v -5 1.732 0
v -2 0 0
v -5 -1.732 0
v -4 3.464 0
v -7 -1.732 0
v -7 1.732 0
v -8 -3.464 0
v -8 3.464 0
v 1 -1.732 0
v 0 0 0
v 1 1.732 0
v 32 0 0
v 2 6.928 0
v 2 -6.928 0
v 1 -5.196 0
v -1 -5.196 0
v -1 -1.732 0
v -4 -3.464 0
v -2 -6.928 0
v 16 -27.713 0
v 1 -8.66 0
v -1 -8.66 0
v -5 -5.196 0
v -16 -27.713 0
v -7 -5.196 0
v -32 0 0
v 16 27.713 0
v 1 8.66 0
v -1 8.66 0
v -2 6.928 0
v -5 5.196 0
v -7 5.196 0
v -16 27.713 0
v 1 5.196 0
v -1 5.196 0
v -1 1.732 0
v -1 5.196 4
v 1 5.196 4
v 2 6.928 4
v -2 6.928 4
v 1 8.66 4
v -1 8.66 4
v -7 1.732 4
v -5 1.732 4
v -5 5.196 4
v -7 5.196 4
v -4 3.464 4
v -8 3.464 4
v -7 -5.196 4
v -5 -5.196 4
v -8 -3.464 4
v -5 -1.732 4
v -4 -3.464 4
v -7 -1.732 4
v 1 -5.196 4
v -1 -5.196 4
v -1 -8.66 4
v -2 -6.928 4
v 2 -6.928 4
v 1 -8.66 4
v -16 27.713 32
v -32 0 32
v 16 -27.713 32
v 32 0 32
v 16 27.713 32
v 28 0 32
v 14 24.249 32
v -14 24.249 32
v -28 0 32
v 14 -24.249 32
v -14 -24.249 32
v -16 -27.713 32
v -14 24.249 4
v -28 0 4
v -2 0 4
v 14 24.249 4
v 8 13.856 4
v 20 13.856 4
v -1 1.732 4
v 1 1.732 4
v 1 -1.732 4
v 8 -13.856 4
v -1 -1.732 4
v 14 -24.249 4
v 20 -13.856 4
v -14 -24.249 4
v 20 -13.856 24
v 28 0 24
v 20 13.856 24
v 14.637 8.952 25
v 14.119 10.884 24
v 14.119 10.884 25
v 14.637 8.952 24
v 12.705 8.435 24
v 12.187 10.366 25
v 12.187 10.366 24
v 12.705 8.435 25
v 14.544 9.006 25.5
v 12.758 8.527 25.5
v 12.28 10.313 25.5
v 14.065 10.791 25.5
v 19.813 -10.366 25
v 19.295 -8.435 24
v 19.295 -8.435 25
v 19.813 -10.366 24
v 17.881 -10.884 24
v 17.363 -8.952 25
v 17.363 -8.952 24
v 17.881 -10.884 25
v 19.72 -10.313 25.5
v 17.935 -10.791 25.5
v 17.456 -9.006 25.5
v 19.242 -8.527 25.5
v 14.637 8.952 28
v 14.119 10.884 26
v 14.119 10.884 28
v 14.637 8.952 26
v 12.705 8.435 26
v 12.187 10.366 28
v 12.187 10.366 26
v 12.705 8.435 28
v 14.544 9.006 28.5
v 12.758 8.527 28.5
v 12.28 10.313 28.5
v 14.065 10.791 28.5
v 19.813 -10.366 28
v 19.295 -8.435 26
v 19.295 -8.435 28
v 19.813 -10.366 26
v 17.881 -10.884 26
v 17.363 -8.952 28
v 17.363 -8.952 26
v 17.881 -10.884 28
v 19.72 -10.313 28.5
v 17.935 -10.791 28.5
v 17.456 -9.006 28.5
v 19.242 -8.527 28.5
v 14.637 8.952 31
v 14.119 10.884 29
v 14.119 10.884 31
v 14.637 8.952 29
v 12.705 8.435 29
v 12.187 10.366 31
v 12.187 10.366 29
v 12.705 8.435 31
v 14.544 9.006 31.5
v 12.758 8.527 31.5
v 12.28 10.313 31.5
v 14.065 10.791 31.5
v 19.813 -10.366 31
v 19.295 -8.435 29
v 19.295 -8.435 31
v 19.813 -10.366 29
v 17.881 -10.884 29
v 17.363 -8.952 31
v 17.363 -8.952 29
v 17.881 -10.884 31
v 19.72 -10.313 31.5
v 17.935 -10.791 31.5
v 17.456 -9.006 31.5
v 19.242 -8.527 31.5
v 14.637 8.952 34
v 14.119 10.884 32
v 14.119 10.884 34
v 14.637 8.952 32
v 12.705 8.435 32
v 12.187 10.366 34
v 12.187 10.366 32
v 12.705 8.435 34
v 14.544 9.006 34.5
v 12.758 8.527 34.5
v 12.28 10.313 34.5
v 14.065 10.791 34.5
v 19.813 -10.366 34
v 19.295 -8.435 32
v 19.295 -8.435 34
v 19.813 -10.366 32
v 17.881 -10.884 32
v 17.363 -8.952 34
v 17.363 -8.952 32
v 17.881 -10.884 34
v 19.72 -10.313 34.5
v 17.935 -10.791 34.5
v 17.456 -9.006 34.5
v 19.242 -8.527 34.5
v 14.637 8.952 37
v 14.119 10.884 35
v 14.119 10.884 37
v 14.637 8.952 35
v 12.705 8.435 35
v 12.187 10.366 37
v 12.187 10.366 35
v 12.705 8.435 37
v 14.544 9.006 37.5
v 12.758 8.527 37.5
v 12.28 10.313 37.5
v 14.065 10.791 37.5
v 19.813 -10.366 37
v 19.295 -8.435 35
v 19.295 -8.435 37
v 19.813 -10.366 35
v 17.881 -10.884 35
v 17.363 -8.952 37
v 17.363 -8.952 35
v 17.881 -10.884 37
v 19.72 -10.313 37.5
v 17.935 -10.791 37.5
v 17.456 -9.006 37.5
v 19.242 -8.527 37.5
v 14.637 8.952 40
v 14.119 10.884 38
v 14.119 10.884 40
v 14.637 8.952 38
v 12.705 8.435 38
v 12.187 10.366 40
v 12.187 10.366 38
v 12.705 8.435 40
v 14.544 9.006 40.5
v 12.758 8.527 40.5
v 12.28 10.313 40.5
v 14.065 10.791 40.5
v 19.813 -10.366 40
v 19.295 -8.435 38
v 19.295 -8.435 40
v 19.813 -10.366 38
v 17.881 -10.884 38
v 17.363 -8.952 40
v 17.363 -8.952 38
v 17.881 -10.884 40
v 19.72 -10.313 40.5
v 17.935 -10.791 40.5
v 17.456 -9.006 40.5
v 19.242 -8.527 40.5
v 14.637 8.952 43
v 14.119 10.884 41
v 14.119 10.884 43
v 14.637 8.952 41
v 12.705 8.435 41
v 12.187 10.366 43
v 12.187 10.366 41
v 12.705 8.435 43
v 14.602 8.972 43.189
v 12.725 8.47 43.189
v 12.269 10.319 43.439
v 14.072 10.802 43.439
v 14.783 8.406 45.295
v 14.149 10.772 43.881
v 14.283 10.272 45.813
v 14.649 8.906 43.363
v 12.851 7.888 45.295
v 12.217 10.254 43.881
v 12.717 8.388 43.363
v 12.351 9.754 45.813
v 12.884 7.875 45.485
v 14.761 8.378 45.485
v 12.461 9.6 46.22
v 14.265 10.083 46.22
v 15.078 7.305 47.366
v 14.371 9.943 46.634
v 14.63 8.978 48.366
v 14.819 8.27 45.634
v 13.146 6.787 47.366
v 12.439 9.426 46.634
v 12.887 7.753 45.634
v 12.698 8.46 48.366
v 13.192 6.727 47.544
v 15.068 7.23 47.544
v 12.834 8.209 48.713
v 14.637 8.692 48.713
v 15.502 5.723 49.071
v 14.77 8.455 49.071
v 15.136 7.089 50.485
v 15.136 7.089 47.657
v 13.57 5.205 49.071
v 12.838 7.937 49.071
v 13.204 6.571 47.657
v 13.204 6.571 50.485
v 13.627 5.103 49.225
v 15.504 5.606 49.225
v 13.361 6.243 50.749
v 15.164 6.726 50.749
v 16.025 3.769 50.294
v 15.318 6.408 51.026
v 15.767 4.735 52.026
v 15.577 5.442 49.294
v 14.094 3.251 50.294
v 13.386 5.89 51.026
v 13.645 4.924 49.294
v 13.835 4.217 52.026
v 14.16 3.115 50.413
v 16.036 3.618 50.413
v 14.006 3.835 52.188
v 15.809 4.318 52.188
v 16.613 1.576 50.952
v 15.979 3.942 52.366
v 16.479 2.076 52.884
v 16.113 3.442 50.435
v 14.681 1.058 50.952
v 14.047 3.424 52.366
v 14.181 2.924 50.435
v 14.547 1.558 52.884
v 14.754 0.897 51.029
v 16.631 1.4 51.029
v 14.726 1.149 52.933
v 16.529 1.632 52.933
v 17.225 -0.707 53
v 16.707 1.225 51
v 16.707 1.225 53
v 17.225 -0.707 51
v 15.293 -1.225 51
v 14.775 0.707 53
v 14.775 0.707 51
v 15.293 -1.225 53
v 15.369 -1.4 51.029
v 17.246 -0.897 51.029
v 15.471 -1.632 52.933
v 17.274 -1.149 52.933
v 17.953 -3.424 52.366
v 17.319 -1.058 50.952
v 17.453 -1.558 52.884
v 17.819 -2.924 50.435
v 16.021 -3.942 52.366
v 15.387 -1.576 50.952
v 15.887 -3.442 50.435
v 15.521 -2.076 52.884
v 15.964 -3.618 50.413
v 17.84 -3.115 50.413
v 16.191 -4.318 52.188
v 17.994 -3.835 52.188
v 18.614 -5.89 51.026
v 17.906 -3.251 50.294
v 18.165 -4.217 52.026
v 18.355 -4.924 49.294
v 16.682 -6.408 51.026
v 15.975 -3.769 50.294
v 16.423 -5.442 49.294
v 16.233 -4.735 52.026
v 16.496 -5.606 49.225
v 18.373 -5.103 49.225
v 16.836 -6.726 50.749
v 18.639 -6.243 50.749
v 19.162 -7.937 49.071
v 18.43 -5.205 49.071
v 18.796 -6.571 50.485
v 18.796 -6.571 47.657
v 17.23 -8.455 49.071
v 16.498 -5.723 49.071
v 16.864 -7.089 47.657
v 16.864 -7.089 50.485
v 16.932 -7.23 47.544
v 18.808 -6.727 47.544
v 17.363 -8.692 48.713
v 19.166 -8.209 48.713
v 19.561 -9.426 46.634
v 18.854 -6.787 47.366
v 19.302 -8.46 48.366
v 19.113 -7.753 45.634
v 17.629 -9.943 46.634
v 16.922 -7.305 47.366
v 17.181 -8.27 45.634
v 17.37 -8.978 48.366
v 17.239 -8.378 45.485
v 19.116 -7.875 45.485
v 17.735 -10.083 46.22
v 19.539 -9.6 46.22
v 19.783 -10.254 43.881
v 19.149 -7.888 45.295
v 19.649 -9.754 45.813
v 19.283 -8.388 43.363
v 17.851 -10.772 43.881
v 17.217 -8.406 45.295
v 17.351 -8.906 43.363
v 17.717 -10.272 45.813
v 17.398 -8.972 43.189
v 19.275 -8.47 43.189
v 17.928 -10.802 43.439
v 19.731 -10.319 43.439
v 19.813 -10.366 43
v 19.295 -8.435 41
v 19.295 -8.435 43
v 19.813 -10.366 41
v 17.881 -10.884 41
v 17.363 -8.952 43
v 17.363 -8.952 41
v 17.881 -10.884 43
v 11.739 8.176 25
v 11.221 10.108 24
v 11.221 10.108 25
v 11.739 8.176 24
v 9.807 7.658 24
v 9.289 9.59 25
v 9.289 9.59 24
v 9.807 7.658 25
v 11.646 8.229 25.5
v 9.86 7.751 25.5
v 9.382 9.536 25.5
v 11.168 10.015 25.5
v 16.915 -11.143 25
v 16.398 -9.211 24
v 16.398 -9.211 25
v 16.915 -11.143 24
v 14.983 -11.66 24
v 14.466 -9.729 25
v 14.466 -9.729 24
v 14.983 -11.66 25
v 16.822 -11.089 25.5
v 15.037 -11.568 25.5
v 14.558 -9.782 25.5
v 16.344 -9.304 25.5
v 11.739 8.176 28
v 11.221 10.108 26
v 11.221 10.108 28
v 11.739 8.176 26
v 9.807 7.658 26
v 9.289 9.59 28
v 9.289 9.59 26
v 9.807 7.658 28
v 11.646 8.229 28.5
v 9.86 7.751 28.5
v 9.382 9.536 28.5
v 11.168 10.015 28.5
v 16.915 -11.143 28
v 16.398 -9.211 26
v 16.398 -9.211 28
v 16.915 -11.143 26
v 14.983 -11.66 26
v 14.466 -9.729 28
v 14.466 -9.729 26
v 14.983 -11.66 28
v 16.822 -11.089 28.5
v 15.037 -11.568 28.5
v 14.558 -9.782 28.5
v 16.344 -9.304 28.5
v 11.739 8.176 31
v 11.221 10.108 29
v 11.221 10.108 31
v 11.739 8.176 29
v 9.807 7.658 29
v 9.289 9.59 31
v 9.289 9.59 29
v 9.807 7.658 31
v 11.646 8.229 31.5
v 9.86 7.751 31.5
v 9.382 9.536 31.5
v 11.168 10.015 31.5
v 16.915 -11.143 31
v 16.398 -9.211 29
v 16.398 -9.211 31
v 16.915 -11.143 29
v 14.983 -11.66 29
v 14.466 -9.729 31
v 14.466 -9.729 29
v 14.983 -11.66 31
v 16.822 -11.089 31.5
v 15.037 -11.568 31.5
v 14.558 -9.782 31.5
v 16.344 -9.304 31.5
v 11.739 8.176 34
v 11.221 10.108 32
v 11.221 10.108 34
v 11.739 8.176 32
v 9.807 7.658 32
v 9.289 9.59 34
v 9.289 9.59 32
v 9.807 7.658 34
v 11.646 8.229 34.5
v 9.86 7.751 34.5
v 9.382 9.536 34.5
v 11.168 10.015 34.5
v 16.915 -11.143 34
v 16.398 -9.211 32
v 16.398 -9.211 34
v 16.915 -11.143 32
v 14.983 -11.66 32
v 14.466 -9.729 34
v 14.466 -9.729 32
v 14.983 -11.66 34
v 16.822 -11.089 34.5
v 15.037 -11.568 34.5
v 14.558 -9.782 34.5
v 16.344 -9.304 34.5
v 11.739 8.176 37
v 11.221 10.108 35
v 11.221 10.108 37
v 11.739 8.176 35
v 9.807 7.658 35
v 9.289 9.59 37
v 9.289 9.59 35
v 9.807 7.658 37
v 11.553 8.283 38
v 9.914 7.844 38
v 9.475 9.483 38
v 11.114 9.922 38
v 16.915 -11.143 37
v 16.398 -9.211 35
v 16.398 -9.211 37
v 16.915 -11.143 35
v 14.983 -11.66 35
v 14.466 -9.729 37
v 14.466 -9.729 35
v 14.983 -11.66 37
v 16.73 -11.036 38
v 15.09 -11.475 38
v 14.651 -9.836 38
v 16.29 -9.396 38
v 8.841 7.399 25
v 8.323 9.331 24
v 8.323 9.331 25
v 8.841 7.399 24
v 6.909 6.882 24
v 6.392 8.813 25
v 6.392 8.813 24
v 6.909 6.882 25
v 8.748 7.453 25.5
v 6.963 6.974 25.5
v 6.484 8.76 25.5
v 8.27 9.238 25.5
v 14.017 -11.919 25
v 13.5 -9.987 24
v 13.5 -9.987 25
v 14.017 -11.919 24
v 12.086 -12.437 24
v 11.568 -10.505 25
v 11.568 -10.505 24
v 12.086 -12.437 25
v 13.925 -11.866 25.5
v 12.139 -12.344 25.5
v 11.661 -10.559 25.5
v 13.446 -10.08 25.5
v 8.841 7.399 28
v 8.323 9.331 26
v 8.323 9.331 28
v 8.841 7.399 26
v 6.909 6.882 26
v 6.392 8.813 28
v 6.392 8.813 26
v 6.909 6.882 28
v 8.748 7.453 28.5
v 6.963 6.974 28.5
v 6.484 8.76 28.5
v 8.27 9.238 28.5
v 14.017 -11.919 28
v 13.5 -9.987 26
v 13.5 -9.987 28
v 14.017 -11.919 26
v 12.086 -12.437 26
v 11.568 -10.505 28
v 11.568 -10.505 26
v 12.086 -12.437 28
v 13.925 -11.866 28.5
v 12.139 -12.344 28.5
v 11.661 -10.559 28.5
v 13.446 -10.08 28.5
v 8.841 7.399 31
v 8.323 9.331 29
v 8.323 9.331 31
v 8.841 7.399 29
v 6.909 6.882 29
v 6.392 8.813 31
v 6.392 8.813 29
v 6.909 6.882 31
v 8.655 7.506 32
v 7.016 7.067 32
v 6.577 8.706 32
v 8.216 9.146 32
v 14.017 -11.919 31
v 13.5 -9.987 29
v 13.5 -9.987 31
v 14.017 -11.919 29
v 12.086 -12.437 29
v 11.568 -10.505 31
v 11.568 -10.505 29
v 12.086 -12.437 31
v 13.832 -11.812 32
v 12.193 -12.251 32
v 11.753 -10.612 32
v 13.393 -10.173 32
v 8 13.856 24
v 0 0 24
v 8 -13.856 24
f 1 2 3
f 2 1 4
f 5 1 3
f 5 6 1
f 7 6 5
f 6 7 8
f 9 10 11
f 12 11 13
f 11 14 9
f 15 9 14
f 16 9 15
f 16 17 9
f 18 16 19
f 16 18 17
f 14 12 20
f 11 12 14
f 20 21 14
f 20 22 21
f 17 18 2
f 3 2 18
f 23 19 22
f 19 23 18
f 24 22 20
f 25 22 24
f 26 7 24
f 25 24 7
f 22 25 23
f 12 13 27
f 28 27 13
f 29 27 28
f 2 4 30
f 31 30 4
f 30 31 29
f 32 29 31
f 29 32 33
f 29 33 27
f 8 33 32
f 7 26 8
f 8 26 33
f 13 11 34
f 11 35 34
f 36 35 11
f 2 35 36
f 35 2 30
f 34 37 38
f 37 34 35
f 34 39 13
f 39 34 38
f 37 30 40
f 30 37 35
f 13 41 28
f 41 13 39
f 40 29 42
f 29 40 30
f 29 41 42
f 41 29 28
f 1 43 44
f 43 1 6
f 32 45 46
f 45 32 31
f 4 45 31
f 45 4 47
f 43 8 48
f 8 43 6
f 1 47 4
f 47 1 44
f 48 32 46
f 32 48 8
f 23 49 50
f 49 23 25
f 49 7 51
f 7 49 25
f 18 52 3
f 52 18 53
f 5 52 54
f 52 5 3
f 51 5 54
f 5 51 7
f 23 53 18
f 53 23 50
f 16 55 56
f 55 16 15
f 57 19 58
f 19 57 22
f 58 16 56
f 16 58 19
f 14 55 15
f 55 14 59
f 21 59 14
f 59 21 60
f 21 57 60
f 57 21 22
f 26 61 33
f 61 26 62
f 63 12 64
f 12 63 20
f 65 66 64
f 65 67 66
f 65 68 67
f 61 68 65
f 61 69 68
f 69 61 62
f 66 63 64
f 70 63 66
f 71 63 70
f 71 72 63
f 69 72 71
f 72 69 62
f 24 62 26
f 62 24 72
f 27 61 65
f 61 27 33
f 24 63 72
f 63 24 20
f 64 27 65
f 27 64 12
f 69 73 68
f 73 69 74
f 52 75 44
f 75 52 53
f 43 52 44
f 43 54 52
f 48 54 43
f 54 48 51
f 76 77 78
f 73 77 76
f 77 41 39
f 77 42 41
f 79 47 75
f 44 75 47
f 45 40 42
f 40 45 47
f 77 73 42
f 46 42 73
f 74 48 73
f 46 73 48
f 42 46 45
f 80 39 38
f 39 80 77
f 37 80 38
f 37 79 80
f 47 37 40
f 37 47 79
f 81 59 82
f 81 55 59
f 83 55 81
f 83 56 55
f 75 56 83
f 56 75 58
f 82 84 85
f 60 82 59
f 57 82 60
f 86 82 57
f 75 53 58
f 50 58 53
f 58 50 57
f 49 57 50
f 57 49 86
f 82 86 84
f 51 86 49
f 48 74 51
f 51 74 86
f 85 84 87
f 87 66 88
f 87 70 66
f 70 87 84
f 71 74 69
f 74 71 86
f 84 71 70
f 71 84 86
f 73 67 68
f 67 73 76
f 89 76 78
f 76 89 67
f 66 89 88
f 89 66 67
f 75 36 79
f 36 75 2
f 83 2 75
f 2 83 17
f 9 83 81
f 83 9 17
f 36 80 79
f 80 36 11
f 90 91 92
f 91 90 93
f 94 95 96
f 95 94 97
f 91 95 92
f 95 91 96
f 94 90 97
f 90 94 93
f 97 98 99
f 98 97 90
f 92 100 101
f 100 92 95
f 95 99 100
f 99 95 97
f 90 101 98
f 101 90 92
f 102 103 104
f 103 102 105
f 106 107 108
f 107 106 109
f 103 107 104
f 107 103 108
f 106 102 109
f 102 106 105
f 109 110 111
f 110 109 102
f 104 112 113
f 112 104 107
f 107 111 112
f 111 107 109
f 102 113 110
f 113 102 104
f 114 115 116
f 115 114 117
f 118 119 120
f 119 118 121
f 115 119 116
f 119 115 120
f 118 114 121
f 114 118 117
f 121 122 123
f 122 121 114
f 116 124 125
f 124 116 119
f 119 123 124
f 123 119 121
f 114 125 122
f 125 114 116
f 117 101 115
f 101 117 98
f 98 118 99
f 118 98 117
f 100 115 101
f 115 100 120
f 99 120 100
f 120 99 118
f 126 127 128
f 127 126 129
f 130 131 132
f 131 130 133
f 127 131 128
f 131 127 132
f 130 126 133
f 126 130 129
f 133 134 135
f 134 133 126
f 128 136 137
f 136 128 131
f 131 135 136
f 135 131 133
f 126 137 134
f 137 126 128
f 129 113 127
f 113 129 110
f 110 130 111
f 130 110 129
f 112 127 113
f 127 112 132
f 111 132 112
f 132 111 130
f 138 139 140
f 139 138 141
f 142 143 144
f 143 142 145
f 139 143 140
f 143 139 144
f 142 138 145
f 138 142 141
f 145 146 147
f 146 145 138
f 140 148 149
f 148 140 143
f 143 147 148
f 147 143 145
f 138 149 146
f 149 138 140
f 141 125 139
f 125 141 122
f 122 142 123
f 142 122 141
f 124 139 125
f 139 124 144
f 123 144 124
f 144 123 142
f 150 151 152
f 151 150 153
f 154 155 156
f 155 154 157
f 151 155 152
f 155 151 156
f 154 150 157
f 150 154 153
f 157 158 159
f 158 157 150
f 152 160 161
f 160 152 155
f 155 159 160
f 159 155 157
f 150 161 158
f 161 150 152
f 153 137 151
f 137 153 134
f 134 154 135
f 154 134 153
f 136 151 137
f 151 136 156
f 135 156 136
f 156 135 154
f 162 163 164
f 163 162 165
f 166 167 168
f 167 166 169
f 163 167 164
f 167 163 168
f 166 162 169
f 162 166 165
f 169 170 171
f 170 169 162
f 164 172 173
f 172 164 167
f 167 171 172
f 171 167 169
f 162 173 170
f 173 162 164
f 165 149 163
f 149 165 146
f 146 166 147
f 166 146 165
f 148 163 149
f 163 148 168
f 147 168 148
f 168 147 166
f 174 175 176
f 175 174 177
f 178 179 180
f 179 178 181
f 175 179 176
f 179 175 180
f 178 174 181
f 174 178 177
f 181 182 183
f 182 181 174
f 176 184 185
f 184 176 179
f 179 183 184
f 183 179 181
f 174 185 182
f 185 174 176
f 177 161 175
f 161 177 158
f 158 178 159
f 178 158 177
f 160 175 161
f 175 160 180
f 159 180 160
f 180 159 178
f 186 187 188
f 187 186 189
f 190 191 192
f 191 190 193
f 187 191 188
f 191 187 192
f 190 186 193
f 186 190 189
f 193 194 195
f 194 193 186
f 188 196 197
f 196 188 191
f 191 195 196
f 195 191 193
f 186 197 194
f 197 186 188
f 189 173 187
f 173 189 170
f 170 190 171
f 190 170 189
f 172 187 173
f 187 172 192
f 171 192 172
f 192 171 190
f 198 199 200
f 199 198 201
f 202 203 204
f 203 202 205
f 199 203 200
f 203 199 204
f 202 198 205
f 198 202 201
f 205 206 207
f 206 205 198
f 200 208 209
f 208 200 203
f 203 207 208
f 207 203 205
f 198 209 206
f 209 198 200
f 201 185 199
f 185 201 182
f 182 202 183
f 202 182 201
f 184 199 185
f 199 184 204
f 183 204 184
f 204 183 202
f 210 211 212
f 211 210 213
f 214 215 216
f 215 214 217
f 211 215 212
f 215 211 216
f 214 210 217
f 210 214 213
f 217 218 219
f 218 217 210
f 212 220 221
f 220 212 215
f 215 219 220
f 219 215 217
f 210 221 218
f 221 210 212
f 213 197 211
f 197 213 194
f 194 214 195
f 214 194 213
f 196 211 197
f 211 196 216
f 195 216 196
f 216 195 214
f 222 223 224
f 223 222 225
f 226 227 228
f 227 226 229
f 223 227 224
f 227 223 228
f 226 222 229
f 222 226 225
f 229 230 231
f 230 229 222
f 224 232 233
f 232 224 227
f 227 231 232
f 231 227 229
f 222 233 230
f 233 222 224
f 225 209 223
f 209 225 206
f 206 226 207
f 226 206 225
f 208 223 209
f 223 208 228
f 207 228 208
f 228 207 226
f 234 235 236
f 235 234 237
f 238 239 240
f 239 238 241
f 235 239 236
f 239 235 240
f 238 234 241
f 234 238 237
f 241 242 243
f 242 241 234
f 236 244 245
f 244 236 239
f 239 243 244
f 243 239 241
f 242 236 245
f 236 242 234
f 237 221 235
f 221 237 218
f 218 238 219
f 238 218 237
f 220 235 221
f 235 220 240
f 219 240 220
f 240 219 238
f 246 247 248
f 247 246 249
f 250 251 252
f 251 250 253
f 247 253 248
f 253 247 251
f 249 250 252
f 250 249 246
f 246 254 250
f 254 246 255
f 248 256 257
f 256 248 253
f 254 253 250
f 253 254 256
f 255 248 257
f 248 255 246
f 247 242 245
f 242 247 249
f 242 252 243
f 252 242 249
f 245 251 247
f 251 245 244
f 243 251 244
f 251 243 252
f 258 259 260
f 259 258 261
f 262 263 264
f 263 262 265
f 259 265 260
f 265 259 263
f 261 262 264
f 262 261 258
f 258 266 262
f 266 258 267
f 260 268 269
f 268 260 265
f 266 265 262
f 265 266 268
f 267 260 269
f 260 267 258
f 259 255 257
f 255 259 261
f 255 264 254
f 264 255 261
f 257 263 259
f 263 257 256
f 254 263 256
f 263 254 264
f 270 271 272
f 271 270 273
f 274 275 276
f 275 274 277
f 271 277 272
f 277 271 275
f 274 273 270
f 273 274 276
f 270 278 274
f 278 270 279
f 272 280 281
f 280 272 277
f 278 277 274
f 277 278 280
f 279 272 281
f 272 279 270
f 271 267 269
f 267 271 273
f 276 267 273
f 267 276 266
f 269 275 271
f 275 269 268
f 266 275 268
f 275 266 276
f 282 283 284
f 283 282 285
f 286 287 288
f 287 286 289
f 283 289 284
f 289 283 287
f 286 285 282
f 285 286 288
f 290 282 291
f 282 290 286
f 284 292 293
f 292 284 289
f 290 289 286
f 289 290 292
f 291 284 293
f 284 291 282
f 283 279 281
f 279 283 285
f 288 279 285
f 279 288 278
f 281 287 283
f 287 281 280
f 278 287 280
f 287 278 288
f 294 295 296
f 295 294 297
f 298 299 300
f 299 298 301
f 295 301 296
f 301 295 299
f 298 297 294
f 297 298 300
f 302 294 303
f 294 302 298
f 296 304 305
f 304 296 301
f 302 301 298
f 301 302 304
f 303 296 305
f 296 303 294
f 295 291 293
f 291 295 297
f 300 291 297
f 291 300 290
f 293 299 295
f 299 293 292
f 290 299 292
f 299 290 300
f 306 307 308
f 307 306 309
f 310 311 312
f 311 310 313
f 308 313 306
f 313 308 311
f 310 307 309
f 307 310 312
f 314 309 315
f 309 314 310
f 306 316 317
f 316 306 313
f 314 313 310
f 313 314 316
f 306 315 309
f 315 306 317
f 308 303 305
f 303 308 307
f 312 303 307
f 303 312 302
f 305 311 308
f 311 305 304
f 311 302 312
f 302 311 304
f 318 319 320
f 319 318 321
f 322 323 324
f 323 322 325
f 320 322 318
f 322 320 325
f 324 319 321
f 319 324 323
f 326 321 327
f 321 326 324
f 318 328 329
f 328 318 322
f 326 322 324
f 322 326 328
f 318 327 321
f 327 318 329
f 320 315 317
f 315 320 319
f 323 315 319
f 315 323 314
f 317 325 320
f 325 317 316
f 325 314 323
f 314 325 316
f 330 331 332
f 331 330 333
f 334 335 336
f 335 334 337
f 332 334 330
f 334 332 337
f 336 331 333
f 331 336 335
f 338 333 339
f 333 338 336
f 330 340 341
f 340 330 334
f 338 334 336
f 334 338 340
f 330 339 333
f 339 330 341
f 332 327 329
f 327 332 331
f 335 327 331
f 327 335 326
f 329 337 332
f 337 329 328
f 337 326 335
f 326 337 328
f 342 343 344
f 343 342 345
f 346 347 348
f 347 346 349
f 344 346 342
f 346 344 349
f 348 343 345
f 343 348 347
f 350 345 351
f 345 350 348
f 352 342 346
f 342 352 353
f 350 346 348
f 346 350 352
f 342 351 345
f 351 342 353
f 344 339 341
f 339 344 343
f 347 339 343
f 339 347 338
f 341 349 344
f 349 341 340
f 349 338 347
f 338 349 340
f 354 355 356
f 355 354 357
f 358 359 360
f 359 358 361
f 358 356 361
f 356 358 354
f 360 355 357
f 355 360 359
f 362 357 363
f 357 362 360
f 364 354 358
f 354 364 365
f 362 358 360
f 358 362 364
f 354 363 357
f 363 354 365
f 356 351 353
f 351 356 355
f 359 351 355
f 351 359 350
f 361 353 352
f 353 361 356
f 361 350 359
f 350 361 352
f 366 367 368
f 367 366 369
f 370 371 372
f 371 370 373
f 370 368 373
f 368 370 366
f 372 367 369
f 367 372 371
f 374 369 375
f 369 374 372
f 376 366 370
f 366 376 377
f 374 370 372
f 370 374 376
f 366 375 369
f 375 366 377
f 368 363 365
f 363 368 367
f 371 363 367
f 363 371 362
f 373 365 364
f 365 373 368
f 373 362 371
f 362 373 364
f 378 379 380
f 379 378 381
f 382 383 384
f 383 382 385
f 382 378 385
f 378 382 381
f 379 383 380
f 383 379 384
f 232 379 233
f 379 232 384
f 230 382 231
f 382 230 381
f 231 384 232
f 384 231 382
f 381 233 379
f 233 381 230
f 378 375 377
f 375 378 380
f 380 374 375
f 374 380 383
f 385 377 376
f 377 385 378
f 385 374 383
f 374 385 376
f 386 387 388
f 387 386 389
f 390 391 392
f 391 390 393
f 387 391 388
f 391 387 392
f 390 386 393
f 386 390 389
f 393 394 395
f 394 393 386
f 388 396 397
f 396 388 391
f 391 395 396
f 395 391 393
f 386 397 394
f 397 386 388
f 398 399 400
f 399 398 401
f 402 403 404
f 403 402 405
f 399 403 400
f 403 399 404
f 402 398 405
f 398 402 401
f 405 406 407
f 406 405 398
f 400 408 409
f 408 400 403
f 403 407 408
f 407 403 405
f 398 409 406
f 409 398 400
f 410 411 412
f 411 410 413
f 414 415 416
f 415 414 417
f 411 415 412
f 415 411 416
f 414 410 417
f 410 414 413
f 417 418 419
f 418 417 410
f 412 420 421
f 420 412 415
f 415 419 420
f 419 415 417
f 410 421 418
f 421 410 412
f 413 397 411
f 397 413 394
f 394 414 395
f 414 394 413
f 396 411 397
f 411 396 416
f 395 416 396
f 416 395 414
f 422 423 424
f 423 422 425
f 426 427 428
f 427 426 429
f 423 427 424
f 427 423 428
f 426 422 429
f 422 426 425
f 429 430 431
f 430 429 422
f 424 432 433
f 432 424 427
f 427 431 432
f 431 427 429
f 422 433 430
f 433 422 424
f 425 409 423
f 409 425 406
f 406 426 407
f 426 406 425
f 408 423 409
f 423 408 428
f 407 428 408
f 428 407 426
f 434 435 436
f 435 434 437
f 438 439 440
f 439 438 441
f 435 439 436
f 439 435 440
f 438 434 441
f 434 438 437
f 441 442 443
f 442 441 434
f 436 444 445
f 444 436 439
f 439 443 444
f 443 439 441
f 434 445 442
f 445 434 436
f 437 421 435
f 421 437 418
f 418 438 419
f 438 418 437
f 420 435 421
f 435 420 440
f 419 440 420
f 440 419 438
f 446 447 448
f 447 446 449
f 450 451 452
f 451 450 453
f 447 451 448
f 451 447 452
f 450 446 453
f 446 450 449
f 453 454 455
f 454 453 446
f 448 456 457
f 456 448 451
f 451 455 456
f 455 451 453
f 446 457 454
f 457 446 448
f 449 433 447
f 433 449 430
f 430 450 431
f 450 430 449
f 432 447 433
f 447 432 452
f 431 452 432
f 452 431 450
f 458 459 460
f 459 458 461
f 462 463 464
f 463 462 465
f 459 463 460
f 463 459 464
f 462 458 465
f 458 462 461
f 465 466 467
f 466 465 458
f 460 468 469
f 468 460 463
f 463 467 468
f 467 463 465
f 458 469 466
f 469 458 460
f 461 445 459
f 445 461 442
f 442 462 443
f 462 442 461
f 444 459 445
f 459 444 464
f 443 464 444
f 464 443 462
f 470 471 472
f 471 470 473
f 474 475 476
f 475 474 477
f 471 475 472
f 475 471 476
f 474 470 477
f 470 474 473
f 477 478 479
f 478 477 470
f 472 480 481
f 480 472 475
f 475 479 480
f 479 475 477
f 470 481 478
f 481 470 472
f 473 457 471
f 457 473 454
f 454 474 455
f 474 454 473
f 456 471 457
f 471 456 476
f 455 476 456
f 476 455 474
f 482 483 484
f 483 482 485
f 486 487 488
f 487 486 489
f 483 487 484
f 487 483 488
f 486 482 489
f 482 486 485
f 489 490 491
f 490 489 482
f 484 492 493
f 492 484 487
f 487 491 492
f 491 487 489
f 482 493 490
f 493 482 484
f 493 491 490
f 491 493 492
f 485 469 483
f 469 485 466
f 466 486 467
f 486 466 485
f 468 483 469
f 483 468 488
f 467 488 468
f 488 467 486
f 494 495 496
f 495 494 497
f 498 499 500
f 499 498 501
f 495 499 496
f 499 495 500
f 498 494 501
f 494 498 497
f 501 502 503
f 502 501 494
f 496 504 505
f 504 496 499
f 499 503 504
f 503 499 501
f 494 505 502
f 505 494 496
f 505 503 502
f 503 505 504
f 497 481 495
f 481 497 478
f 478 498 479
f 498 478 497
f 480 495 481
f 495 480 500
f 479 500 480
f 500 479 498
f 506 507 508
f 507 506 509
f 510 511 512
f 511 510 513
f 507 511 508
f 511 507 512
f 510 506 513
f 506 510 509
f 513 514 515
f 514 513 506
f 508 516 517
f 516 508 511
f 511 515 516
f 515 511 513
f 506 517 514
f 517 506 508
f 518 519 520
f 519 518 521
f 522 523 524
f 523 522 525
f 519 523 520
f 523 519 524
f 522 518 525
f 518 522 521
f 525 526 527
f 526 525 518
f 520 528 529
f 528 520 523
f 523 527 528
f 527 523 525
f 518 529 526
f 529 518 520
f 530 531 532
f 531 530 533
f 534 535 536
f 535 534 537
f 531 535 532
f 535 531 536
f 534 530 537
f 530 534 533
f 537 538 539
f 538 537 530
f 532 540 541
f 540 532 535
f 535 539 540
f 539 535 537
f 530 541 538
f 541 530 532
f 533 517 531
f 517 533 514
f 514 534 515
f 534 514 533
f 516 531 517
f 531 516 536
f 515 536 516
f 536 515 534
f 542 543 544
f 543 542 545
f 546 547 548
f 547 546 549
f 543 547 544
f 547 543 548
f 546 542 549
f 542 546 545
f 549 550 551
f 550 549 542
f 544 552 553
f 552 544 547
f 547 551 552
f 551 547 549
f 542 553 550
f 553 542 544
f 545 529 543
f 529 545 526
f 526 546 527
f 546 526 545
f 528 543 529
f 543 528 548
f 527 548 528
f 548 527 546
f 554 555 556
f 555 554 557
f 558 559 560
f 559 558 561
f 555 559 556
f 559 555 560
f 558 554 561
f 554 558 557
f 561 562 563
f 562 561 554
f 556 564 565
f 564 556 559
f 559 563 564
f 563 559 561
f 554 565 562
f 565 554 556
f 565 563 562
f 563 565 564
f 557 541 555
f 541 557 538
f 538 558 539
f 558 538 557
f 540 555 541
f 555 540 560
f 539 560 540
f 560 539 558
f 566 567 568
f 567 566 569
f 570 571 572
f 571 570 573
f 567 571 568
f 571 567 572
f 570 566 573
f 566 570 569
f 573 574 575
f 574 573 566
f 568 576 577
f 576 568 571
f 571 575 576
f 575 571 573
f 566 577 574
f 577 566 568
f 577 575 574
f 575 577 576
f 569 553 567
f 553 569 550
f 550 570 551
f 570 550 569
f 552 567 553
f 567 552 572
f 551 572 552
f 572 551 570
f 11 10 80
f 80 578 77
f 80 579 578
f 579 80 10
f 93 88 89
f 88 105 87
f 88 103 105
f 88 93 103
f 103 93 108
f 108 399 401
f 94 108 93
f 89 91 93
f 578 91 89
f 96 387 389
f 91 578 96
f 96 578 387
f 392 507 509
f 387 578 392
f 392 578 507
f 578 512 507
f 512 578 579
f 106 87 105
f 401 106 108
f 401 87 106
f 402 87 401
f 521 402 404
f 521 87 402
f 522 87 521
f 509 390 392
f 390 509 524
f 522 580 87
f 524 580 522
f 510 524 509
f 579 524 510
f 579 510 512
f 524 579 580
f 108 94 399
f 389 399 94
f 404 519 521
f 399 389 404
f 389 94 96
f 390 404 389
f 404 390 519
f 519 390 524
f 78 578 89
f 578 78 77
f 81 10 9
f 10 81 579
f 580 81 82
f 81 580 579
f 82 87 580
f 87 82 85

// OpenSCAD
// file: planter_base.scad
module planter_base() {
    difference() {
        linear_extrude(32) circle(32, $fn=6);
        translate([0, 0, 4]) linear_extrude(32) circle(28, $fn = 6);
        linear_extrude(8) circle(2, $fn = 6);
        for (i = [0:60:300]) {
            linear_extrude(8) rotate(i) translate([6, cos(30)*4]) circle(2, $fn = 6);
        }
    }
}
// main file
include <planter_base.scad>;

module planter_01() {
    module brick() {
        union() {
            cube(2, center = true);
            translate([0, 0, 1.5]) rotate(45) cylinder(1, r1 = sqrt(2), r2 = 1.2, center = true, $fn = 4);
            translate([0, 0, -1.5]) rotate(45) cylinder(1, r1 = 1.2, r2 = sqrt(2), center = true, $fn = 4);
        }
    }
    
    module columns(brick_count) {
        union() {
            for (i=[0:1:brick_count-1]) {
                translate([0, 10, i*3]) brick();
                translate([0, -10, i*3]) brick();
            }
        }
    }
    
    module arch() {
        union() {
            columns(6);
            for (i = [0:15:180]) {
                translate([0, 0, 18]) rotate(i, [1, 0, 0]) translate([0, 10, 0]) brick();
            }
        }
    }
    
    union() {
        planter_base();
        translate([16, 0]) linear_extrude(24) circle(16, $fn = 6);
        translate([16, 0, 24]) rotate(15) {
            arch();
            translate([-3, 0, 0]) columns(5);
            translate([-6, 0, 0]) columns(3);
        }
    }
}

if (is_undef($demo)) {
    planter_01();
}
